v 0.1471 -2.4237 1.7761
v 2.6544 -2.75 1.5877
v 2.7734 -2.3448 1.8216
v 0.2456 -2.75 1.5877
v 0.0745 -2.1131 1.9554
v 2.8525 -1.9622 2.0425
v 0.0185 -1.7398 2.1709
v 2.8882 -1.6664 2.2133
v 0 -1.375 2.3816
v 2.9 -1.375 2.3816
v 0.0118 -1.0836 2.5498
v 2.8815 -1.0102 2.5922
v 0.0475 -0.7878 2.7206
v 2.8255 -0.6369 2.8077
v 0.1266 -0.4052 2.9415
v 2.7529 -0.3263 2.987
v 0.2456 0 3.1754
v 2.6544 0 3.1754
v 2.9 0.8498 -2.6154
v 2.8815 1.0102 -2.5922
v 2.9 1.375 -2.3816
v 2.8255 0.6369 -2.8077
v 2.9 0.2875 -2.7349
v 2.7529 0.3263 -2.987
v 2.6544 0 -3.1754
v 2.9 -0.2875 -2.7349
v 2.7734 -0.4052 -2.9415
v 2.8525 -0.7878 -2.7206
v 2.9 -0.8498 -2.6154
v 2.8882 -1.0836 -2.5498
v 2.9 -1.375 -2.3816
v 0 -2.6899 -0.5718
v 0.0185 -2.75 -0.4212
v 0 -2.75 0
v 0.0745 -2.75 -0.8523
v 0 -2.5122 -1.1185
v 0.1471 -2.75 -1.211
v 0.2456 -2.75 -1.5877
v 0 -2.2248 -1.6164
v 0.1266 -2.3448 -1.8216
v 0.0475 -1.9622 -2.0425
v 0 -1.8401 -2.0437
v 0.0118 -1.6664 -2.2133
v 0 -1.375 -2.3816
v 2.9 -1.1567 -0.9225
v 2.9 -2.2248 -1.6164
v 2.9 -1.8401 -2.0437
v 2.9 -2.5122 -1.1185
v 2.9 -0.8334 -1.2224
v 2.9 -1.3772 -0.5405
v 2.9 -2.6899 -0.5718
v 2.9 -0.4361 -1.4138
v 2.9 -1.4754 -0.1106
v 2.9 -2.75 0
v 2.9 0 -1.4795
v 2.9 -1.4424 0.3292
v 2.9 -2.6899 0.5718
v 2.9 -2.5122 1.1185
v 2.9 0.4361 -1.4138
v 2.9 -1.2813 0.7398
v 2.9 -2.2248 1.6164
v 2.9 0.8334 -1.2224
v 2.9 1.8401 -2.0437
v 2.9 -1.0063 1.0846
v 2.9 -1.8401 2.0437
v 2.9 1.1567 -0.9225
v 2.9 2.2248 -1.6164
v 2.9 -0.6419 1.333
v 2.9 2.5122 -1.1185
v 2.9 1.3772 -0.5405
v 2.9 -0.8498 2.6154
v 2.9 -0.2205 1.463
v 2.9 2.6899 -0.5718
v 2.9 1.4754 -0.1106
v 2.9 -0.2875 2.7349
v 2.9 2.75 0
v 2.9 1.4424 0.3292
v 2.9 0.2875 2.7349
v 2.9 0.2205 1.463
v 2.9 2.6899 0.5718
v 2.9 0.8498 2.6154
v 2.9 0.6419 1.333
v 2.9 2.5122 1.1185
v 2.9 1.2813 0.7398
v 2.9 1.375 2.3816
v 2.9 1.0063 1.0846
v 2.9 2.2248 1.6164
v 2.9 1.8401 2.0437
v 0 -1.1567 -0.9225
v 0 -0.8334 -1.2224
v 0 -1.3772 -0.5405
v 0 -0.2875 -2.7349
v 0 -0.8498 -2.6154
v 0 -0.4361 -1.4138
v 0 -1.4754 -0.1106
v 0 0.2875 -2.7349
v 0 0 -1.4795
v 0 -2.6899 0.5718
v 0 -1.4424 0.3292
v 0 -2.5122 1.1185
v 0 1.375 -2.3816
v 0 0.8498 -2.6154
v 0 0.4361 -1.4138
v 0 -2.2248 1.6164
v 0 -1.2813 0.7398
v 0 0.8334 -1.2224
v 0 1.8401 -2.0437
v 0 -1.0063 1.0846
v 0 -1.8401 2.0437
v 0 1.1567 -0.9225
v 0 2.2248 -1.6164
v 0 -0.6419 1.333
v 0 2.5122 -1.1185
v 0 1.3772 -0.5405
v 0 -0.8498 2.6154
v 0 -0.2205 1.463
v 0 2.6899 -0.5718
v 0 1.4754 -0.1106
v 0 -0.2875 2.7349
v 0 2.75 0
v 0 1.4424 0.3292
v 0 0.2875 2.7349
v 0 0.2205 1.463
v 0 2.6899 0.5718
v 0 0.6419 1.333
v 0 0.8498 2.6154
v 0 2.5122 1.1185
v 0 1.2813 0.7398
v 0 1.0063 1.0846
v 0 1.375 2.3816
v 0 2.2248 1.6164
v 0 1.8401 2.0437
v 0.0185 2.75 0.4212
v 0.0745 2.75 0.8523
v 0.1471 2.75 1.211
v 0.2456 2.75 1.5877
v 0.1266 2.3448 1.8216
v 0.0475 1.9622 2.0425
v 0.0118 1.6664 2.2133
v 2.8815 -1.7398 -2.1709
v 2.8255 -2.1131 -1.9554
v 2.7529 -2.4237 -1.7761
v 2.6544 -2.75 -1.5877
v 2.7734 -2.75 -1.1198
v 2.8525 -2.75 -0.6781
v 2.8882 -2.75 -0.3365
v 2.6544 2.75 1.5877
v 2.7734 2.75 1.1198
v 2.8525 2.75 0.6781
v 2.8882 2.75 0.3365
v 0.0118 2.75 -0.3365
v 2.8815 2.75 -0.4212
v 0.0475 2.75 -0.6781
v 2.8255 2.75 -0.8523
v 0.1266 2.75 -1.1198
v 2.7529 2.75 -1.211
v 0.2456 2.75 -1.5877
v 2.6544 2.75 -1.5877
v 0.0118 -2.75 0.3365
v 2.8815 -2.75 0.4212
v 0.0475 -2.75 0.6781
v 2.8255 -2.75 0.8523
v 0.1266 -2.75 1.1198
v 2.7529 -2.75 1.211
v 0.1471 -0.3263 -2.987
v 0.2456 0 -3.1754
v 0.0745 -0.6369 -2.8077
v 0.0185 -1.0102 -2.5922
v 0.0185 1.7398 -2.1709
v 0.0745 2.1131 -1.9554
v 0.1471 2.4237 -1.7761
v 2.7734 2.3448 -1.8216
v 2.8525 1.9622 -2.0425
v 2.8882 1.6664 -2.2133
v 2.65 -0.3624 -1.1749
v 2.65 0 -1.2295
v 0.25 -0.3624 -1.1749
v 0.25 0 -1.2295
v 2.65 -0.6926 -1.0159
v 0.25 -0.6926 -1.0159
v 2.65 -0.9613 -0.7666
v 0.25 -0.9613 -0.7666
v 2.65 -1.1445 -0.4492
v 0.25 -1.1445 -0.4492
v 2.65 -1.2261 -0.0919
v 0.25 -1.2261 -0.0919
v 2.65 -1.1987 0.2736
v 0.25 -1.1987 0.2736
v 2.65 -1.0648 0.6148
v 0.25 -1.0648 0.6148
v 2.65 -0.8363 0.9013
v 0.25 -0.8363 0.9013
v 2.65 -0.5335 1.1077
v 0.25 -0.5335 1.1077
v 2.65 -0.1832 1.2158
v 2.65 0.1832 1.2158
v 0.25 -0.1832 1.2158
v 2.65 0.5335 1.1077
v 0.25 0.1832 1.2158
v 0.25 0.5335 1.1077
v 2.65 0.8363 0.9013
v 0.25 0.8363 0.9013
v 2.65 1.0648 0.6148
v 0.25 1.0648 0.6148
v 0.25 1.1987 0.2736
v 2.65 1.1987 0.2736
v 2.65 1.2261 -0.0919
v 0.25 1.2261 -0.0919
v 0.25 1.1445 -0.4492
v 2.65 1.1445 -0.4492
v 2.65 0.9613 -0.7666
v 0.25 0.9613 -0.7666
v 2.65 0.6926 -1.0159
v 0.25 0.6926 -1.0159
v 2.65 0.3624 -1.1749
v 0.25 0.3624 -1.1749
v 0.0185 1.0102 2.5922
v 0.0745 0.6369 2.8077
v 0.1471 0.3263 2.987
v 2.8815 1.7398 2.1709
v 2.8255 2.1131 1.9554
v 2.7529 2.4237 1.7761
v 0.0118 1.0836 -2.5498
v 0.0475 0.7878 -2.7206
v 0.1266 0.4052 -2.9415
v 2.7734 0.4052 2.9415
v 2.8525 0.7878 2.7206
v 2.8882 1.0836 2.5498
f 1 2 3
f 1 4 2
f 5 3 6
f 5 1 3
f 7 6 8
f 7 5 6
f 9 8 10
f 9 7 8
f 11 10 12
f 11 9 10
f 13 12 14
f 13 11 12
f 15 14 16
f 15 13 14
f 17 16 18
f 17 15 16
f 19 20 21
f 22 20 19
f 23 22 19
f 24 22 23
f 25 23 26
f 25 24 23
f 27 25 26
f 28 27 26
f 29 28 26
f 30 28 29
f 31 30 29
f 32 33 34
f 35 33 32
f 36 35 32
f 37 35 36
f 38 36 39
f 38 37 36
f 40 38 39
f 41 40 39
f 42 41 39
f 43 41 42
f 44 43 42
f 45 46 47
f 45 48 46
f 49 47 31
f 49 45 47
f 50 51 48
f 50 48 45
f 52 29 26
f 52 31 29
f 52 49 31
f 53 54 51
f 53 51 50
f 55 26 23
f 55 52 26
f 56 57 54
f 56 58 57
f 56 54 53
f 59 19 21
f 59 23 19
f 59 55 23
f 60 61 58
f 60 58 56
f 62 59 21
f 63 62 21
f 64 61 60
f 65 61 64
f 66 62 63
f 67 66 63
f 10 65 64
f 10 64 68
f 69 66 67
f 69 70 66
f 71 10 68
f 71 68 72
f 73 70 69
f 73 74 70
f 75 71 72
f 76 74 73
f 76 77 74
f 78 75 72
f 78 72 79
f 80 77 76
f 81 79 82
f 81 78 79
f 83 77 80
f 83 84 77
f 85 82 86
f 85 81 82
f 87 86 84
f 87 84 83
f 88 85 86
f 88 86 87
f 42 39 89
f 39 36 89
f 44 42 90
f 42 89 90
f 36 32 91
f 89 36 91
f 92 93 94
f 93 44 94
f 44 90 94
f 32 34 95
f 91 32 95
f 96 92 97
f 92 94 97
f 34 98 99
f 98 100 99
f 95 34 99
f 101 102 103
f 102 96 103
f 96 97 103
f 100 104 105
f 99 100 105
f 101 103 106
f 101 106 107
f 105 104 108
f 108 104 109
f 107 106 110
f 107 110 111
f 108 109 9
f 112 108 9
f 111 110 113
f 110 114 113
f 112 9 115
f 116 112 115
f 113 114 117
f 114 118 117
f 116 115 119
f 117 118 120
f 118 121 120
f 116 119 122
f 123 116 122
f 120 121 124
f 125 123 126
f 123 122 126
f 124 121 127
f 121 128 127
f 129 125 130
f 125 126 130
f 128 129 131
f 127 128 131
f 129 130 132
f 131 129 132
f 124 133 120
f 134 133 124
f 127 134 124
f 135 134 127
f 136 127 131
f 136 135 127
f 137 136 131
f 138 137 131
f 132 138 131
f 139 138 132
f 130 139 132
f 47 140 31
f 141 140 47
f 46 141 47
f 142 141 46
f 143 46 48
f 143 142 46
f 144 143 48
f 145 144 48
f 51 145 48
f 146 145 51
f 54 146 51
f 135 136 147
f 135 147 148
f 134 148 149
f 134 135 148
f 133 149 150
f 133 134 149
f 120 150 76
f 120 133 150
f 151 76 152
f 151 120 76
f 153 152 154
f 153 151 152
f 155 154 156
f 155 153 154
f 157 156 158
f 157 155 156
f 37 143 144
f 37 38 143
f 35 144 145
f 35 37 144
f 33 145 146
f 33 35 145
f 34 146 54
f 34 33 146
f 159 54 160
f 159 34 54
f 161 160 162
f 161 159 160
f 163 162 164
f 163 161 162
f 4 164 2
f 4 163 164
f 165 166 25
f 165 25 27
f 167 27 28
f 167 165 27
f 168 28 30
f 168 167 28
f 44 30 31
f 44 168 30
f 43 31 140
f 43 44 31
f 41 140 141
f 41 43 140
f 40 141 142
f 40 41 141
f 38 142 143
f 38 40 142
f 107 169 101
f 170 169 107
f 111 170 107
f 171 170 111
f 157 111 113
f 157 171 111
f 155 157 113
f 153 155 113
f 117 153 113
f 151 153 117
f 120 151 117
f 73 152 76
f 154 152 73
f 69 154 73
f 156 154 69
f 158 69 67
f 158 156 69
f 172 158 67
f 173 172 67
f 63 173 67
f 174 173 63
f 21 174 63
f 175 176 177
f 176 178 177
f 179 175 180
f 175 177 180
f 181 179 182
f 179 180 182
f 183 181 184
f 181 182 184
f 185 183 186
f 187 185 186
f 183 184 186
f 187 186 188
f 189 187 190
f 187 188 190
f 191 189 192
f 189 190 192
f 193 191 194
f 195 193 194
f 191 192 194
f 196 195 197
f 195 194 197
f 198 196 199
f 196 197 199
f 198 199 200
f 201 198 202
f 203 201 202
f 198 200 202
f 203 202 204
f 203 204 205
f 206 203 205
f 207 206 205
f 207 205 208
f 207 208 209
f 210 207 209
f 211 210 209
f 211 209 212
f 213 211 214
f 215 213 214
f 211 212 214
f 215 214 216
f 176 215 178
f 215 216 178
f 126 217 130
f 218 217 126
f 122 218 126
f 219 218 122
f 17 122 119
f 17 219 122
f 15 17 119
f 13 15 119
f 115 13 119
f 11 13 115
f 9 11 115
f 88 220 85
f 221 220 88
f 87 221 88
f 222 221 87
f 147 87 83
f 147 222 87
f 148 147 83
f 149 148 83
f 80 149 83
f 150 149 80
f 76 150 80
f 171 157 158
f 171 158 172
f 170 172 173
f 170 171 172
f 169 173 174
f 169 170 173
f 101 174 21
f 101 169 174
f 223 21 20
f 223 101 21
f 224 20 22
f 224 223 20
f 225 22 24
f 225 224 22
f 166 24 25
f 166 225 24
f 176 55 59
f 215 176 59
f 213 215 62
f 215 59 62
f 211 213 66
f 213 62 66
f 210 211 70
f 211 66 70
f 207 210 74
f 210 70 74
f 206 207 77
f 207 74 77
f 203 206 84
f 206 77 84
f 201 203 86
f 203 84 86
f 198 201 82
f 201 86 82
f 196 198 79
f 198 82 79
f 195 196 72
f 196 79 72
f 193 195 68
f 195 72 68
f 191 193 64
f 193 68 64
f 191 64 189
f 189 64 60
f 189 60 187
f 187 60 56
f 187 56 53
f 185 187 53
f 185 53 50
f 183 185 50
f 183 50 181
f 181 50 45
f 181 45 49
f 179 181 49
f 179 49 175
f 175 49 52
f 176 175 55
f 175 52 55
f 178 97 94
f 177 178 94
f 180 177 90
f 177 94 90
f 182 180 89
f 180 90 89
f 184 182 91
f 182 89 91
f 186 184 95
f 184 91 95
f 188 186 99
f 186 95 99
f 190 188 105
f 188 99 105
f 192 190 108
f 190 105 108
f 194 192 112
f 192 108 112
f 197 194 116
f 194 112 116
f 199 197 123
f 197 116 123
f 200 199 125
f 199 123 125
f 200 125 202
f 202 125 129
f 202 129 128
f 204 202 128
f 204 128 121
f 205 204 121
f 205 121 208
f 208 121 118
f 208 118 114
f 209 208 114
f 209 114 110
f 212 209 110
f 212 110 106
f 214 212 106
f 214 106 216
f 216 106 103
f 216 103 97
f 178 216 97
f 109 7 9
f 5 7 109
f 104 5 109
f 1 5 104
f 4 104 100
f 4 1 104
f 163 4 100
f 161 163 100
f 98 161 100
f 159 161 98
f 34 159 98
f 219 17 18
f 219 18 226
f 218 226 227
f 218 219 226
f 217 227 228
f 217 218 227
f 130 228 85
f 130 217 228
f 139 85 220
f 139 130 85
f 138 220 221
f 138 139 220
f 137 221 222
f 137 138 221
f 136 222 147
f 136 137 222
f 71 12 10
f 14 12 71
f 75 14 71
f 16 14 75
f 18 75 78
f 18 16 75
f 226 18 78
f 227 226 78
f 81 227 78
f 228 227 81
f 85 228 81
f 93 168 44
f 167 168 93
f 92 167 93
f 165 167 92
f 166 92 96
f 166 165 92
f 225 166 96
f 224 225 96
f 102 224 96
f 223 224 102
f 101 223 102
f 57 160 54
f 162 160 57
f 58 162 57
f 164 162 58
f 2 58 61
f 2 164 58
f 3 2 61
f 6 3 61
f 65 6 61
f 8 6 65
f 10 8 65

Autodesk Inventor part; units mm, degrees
sketch "Boceto1" plane through (0, 0, 0) normal (1, 0, 0) x (0, 1, 0)
  line L0 (2.75, 1.5877) -> (2.75, -1.5877)
  line L1 (2.75, -1.5877) -> (0, -3.1754)
  line L2 (0, -3.1754) -> (-2.75, -1.5877)
  line L3 (-2.75, -1.5877) -> (-2.75, 1.5877)
  line L4 (-2.75, 1.5877) -> (0, 3.1754)
  line L5 (0, 3.1754) -> (2.75, 1.5877)
  circle A0 centre (0, 0) radius 2.75 construction
  dimension "d0" = 5.5
extrude "Extrusión1" add sketch "Boceto1" along normal blind 2.9
sketch "Boceto2" plane through (2.9, 0, 0) normal (1, 0, 0) x (0, 1, 0)
  line L0 (-2.75, 1.5877) -> (0, 3.1754) projected
  line L1 (0, -3.1754) -> (-2.75, -1.5877) projected
  line L2 (-2.75, 1.5877) -> (2.75, -1.5877) construction
  line L3 (-2.75, -1.5877) -> (2.75, 1.5877) construction
  point P0 (0, 0)
hole "Agujero1" at (2.9, 0, 0) direction (-1, 0, 0) diameter 2.459 end through all thread size "M3x0.5" class "6H" standard "ISO Metric profile"
chamfer "Chaflán1" distance 0.25 angle 45 2 edges at (2.9, 0, 1.2295) (0, 0, 1.2295)
sketch "Boceto3" plane through (0, 0, 0) normal (0, 1, 0) x (-1, 0, 0)
  line L0 (-7.0172, 0) -> (2.1698, 0) projected
  line L1 (-5.7048, 0) -> (0.8574, 0)
  line L2 (-2.9, 0) -> (-2.9, -3.1754)
  line L3 (-2.9, -3.1754) -> (0, -3.1754)
  line L4 (0, -3.1754) -> (0, 0)
  line L5 (-2.9, -1.5877) -> (-2.9, -3.1754) projected
  line L6 (0, -1.5877) -> (0, -3.1754) projected
  line L7 (0, -3.1754) -> (-2.9, -3.1754) projected
  line L8 (-2.9, -2.75) -> (-2.6544, -3.1754)
  line L9 (-2.9, -3.1754) -> (-2.9, -2.75)
  line L10 (-2.9, -3.1754) -> (-2.6544, -3.1754)
  line L11 (0, -2.75) -> (-0.2456, -3.1754)
  line L12 (-0.2456, -3.1754) -> (0, -3.1754)
  line L13 (0, -3.1754) -> (0, -2.75)
  dimension "d32" = 2.75
  dimension "d33" = 30
revolve "Revolución1" cut sketch "Boceto3" angle 360 about axis through (0, 0, 0) along (-1, 0, 0) contours L8 L3 L2 | L4 L3 L11
ref_plane "MSC_PT1" through (2.9, 0, 0) normal (1, 0, 0) x (0, 1, 0)
ref_plane "MSC_PT2" through (0, 0, 0) normal (-1, 0, 0) x (0, -1, 0)
ref_plane "MSC_PF1" through (0, 0, 0) normal (1, 0, 0) x (0, 1, 0)
equation "\"d0\" = Smax"
equation "\"d1\" = Mmax"
equation "\"d10\" = 0.5 * PTC"
equation "\"d32\" = 0.5 * Smax"
equation "\"NND\" = 3"
equation "\"Smax\" = 5.5"
equation "\"Mmax\" = 2.9"
equation "\"PTC\" = 0.5"
equation "\"THREADDIA\" = NND"
equation "\"TEMPLATE\" = 1.2345"
properties part number "ANSI B18.2.4.2M - M3x0,5" material "Acero, suave"
